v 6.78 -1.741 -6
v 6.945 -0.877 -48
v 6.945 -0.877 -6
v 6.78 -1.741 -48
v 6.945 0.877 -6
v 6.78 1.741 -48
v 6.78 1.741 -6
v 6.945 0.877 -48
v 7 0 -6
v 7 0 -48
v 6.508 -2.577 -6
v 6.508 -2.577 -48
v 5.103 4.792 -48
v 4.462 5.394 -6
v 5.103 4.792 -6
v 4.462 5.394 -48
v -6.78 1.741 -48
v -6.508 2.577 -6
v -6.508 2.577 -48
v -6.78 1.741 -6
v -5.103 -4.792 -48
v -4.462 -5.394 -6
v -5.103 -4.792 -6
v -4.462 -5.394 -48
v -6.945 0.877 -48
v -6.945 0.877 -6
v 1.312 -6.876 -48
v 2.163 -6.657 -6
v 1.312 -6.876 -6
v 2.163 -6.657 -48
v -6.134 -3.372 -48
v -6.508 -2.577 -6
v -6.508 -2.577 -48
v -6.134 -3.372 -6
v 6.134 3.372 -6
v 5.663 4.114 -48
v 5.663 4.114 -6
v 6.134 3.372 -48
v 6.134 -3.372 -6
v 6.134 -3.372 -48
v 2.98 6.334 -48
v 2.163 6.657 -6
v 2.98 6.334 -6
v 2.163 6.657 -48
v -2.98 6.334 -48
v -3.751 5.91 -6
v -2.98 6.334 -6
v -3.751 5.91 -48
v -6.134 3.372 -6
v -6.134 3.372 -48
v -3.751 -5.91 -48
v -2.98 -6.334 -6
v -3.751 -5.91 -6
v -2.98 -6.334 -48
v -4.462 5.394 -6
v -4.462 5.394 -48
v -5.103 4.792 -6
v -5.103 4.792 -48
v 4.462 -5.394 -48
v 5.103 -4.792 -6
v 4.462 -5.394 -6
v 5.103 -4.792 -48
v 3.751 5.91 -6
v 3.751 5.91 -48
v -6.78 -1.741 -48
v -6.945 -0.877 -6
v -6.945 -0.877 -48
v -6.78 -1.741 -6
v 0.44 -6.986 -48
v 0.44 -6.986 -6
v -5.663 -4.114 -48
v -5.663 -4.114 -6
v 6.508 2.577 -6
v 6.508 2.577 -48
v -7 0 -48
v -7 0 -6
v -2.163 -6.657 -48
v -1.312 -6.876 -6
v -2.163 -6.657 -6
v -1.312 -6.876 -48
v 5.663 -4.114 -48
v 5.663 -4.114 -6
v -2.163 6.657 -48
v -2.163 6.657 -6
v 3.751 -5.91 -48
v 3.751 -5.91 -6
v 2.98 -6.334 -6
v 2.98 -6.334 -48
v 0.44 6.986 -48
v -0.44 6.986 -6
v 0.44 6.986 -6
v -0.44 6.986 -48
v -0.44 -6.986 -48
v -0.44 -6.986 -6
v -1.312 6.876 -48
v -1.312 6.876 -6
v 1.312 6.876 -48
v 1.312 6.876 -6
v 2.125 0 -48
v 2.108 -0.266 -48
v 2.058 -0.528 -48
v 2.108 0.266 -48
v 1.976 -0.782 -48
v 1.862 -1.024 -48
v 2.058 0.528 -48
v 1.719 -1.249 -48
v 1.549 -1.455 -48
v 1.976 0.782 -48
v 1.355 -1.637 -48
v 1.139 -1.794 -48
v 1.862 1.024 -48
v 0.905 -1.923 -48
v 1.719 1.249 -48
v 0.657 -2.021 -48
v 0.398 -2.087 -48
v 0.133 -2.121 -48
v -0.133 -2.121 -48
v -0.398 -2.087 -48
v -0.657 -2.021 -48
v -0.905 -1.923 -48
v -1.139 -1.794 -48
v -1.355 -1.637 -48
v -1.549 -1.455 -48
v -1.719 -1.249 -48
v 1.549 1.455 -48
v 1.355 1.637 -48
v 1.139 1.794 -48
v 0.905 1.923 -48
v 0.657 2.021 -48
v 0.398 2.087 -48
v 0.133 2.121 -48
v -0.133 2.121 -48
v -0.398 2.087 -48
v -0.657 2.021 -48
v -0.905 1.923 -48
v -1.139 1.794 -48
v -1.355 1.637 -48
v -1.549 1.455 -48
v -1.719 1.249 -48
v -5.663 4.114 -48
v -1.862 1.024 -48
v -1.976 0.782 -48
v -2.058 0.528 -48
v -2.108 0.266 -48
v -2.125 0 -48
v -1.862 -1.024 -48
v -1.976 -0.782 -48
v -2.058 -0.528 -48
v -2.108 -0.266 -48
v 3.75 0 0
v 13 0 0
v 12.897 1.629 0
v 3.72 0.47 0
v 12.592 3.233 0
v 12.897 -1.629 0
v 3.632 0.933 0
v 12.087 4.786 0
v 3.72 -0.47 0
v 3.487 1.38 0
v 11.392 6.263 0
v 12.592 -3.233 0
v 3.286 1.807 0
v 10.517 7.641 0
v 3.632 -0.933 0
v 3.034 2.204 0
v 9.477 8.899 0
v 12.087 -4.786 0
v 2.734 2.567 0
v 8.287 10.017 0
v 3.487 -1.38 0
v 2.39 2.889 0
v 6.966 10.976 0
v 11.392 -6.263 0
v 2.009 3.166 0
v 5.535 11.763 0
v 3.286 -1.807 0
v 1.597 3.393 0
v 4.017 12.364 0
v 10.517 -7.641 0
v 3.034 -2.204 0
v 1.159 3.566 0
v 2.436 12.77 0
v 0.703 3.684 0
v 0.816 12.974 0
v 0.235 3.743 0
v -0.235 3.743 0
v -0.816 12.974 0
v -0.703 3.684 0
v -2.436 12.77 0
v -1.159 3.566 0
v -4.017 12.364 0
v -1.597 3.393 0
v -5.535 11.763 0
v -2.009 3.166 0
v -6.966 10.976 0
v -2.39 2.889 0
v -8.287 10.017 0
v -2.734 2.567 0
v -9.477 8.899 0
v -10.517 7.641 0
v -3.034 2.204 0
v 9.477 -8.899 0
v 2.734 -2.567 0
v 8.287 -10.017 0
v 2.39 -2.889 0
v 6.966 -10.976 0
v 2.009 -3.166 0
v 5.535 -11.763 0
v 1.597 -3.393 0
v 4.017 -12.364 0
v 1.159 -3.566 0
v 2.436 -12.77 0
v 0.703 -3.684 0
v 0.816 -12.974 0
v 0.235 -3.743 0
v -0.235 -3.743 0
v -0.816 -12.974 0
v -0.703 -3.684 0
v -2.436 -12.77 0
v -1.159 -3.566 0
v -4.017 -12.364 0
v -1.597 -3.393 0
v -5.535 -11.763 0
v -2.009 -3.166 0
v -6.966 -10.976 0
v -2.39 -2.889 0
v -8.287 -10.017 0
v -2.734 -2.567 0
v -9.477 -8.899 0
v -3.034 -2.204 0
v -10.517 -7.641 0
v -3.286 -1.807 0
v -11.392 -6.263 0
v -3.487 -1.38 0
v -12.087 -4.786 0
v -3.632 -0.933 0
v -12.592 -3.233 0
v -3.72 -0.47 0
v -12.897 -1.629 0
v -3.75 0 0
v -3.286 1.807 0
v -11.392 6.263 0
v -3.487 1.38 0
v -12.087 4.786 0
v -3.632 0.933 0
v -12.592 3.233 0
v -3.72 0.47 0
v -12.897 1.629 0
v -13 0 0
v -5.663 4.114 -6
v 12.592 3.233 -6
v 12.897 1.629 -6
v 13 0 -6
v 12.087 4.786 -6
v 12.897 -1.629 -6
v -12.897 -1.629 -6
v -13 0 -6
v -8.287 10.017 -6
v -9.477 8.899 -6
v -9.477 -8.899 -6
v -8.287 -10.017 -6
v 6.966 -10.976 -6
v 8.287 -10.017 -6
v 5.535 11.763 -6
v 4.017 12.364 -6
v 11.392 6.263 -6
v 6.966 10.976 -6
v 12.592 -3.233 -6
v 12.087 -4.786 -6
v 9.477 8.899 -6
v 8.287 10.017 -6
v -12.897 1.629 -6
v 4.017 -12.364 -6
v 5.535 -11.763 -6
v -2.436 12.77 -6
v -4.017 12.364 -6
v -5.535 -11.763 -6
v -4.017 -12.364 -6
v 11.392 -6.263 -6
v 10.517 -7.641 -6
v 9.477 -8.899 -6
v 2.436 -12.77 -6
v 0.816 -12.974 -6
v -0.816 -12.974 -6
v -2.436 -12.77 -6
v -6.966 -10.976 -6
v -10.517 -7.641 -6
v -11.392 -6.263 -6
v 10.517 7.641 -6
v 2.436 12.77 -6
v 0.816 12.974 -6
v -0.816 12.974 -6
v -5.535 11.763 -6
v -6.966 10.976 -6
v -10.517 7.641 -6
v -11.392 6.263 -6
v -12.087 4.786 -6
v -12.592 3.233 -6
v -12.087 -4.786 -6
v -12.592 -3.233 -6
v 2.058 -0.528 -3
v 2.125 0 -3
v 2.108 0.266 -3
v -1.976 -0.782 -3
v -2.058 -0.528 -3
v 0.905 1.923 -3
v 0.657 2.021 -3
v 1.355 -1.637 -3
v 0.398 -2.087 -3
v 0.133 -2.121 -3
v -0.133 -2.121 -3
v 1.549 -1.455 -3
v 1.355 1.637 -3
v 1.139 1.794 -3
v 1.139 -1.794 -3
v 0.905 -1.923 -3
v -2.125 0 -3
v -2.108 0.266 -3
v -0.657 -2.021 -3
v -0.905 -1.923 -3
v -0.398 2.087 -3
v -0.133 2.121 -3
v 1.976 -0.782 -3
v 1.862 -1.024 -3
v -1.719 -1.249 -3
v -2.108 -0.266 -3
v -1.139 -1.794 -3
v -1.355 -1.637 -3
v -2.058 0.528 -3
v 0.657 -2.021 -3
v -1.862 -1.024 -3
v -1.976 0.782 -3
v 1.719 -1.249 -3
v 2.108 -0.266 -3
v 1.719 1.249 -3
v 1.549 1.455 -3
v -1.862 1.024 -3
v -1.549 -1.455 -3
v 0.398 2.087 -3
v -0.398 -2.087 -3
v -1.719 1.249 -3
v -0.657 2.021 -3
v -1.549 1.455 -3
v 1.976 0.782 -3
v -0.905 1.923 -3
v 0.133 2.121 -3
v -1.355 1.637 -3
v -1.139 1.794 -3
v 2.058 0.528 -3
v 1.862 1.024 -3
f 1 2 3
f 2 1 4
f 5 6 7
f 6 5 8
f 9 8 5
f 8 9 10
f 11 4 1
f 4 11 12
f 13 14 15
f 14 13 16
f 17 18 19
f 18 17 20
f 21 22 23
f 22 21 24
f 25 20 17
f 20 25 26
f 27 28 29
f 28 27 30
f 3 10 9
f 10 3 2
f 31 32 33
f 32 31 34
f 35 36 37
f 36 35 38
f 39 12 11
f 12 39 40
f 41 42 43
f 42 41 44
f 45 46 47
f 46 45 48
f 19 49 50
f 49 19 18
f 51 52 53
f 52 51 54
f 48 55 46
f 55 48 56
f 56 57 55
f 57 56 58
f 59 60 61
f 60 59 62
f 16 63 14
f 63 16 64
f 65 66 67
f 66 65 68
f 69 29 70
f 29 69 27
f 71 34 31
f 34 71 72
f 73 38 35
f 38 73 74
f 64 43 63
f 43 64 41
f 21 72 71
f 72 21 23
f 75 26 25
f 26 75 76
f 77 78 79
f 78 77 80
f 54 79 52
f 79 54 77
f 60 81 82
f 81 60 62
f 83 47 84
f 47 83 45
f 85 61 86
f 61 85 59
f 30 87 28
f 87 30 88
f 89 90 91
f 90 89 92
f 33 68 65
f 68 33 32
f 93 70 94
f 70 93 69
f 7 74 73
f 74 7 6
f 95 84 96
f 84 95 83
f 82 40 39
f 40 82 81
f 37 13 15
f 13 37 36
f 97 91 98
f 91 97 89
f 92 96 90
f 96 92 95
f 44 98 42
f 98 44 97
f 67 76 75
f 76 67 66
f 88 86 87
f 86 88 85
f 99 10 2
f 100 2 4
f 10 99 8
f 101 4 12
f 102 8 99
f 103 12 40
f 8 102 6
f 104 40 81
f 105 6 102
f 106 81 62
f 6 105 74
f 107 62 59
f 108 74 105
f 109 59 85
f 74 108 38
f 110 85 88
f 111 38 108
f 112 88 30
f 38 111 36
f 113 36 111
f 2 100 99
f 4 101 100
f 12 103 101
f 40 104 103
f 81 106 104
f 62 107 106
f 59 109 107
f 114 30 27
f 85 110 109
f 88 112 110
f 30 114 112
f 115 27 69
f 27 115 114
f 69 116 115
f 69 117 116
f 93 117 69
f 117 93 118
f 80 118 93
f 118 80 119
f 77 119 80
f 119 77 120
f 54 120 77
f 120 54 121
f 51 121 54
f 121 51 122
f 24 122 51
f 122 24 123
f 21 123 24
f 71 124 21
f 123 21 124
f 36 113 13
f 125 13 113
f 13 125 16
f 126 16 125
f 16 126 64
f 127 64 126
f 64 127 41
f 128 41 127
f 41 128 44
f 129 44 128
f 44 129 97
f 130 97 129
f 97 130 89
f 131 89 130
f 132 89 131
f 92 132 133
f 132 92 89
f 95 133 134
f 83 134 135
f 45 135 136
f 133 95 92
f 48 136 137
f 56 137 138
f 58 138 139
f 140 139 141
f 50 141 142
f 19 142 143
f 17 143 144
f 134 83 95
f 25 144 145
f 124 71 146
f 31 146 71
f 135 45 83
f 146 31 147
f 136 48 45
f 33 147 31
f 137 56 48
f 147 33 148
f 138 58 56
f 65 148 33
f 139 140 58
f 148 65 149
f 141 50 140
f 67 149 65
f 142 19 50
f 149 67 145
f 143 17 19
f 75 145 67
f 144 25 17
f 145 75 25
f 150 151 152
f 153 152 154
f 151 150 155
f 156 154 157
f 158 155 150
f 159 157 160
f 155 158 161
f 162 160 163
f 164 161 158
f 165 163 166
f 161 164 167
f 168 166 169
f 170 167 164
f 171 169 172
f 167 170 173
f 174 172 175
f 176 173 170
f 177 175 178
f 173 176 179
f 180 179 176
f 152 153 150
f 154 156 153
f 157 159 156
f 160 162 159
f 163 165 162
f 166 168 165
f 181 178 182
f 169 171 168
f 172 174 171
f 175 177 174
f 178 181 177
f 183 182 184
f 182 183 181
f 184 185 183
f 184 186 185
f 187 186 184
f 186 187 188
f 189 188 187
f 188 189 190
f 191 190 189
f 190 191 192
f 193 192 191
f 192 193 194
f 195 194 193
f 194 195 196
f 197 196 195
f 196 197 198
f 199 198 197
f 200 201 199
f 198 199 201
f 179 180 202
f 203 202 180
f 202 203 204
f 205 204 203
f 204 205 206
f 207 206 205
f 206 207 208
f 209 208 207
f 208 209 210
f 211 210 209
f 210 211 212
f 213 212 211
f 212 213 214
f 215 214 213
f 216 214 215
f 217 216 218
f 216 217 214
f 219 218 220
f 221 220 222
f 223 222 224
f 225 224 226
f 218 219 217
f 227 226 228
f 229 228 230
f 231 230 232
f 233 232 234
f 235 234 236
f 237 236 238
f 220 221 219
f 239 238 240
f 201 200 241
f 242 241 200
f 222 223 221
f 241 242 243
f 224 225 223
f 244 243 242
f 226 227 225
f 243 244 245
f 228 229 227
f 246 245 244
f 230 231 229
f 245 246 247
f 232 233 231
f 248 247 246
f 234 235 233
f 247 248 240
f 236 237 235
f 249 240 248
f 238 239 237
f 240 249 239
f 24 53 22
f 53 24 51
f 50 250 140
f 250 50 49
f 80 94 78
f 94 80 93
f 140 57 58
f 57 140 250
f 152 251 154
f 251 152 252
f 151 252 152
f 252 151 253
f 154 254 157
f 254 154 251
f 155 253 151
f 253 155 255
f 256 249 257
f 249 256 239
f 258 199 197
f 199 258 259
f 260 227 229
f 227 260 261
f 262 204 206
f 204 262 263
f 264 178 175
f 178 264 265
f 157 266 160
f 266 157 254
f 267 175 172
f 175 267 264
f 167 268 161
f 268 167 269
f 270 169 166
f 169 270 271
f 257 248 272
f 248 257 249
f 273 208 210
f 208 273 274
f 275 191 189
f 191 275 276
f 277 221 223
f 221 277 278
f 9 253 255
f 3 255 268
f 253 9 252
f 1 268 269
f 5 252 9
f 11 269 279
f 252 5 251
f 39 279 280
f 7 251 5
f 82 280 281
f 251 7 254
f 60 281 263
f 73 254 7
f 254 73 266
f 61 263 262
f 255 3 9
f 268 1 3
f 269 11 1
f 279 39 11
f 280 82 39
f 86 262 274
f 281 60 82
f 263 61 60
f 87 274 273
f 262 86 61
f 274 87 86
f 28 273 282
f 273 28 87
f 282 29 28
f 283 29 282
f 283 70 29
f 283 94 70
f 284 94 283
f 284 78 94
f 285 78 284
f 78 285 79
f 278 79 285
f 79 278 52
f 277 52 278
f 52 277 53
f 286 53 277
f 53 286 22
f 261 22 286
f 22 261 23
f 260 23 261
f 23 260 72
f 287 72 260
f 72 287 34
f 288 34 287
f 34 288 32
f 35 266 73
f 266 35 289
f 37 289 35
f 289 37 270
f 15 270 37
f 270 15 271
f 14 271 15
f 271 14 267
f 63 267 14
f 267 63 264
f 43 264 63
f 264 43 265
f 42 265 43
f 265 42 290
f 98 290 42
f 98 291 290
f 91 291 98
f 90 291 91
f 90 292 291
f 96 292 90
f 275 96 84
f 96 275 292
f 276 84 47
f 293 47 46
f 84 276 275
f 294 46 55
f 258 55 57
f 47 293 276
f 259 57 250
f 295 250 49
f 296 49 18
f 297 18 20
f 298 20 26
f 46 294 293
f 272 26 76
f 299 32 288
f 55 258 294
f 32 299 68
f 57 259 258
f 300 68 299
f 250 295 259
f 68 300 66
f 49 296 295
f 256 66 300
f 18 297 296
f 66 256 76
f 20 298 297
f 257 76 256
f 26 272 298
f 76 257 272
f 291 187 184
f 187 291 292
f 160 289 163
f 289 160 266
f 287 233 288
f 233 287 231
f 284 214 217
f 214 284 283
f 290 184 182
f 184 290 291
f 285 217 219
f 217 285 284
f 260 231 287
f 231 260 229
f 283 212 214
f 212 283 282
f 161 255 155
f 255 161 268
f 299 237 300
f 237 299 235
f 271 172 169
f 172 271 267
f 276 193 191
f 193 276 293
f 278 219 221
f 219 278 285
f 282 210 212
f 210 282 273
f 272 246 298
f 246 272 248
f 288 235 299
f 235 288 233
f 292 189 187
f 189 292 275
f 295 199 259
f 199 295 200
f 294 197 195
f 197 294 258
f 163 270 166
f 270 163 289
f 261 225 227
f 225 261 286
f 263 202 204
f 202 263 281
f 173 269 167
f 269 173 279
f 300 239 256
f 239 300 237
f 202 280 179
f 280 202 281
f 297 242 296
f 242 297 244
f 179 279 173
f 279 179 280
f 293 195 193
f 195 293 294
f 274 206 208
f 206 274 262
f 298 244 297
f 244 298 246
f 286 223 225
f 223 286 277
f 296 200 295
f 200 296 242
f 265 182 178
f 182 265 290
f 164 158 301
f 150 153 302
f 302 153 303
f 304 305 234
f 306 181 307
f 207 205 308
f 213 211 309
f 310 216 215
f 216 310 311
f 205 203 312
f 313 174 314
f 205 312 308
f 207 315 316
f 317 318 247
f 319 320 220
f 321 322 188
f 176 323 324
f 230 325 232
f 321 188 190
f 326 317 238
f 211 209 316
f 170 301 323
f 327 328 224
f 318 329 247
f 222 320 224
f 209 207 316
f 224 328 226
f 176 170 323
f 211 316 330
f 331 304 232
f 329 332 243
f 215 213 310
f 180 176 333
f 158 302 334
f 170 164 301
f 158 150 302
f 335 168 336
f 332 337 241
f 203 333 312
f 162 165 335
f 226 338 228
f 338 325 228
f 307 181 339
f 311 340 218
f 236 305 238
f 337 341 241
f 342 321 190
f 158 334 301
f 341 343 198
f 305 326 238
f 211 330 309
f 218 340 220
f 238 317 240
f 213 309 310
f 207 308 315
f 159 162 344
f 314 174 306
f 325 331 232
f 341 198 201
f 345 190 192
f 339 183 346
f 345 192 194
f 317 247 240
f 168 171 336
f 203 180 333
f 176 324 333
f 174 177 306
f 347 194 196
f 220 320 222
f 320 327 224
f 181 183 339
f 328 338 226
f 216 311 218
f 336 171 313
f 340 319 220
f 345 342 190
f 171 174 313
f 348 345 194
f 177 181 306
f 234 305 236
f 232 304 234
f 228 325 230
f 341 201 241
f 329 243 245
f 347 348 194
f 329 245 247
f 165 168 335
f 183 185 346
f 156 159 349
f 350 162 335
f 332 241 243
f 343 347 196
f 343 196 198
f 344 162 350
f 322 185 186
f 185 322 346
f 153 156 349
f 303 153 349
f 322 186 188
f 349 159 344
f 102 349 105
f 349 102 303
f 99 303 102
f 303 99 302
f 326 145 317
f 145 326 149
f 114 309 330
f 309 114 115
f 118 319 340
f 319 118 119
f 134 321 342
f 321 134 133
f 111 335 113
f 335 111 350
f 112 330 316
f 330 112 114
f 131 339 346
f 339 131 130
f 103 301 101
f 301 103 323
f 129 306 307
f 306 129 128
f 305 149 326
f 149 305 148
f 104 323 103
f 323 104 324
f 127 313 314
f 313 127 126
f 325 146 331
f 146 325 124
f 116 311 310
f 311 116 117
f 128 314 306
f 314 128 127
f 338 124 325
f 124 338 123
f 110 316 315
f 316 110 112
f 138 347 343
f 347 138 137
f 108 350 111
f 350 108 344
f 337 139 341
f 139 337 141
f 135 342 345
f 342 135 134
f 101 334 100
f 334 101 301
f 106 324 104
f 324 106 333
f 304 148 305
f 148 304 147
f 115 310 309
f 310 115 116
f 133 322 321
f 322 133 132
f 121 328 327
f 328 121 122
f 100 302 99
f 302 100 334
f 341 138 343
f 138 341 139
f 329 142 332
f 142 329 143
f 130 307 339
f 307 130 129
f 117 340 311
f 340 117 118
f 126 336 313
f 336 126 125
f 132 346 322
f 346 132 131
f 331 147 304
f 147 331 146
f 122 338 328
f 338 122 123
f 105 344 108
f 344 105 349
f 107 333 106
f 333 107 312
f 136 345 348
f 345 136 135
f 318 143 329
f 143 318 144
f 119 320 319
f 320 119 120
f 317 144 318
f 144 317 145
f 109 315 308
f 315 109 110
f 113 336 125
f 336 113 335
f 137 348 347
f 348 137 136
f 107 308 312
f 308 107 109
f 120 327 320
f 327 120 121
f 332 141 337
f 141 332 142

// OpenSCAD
$fn = 50;


difference() {
	union() {
		translate(v = [0, 0, -48.0000000000]) {
			cylinder(h = 48, r = 7.0000000000);
		}
		translate(v = [0, 0, -6.0000000000]) {
			cylinder(h = 6, r = 13.0000000000);
		}
	}
	union() {
		translate(v = [0, 0, 0]) {
			rotate(a = [0, 0, 0]) {
				difference() {
					union() {
						#translate(v = [0, 0, -48.0000000000]) {
							cylinder(h = 48, r = 2.0000000000);
						}
						#translate(v = [0, 0, -3]) {
							cylinder(h = 3, r = 7.0000000000, r1 = 2.1250000000, r2 = 3.7500000000);
						}
						#translate(v = [0, 0, -48.0000000000]) {
							cylinder(h = 48, r = 2.1250000000);
						}
						#translate(v = [0, 0, -48.0000000000]) {
							cylinder(h = 48, r = 2.0000000000);
						}
					}
					union();
				}
			}
		}
	}
}
